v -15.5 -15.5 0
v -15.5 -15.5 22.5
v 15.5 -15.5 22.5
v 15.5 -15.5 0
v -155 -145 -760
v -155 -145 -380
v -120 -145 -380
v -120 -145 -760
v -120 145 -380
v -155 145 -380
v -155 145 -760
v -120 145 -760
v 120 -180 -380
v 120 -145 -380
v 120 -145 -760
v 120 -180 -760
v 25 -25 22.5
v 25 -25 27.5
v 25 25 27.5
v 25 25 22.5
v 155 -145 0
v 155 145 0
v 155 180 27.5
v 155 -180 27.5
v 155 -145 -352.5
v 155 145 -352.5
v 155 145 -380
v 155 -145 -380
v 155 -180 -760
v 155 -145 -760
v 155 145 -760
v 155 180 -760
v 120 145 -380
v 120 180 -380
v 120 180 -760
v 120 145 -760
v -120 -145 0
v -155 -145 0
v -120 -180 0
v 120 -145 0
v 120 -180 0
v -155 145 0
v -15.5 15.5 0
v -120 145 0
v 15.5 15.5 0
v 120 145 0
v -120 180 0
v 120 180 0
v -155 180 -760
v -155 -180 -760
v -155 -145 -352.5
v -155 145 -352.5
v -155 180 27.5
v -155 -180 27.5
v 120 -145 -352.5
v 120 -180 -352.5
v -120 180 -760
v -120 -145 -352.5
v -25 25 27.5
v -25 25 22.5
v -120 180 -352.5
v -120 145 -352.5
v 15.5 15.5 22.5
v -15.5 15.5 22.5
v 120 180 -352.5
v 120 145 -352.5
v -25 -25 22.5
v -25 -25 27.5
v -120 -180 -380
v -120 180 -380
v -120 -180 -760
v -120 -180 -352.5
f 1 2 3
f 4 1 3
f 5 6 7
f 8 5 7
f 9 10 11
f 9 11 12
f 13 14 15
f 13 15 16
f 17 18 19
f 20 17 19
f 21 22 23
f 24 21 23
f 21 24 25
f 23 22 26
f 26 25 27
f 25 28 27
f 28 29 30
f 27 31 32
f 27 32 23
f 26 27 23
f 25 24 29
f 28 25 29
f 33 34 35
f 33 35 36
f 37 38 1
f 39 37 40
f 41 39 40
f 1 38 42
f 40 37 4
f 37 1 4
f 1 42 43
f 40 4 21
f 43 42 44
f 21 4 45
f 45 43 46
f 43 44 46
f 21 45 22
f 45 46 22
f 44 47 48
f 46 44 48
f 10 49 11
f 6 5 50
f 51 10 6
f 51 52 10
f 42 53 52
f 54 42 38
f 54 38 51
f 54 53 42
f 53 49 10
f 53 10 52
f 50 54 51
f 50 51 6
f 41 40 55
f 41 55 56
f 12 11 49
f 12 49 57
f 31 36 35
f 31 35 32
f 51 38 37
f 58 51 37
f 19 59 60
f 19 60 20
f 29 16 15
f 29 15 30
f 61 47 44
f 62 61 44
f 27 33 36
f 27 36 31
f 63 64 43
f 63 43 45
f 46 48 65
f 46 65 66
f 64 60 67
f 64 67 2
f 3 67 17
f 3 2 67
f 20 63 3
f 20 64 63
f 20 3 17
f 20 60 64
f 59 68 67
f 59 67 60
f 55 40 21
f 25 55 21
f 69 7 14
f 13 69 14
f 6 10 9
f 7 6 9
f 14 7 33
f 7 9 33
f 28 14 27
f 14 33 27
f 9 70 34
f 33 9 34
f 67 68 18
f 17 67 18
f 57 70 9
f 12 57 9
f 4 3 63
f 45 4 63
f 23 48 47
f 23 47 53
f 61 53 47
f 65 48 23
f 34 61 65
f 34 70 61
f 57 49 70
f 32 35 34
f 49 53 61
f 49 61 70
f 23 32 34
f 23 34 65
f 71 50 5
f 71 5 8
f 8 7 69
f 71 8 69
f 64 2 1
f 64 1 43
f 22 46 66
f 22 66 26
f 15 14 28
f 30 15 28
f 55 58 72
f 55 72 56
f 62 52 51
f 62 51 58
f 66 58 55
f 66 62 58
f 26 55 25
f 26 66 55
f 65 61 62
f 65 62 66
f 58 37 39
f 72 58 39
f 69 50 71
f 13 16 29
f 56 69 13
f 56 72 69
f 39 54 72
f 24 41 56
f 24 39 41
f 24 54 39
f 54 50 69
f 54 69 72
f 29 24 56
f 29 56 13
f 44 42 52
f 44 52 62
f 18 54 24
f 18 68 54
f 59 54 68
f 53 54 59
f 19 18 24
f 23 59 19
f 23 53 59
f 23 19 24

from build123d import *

# Parameters (mm, degrees)
SKETCH_W            = 310
SKETCH_H            = 360
PAD_DEPTH           = 27.5
SKETCH001_W         = 35
SKETCH001_H         = 35
PAD001_DEPTH        = 760
LINEARPATTERN_COUNT = 2
LINEARPATTERN_PITCH = 380
SKETCH002_W         = 31
SKETCH002_H         = 31
POCKET_DEPTH        = 28
SKETCH003_W         = 50
SKETCH003_H         = 50
POCKET001_DEPTH     = 5


with BuildPart() as part:
    # Sketch → Pad (new body)
    with BuildSketch(Plane.XY):
        Rectangle(SKETCH_W, SKETCH_H)
    pad = extrude(amount=PAD_DEPTH)

    # Sketch001 (on Face5 of Pad) → Pad001 (join)
    with BuildSketch(Plane(origin=(0, 0, 0), x_dir=(1, 0, 0), z_dir=(0, 0, -1))):
        with Locations((-137.5, 162.5)):
            Rectangle(SKETCH001_W, SKETCH001_H)
        with Locations((-137.5, -162.5)):
            Rectangle(SKETCH001_W, SKETCH001_H)
        with Locations((137.5, 162.5)):
            Rectangle(SKETCH001_W, SKETCH001_H)
        with Locations((137.5, -162.5)):
            Rectangle(SKETCH001_W, SKETCH001_H)
    extrude(amount=PAD001_DEPTH)

    # LinearPattern: Pad ×2
    with Locations(*[(0, 0, -i * LINEARPATTERN_PITCH) for i in range(1, LINEARPATTERN_COUNT)]):
        add(pad)

    # Sketch002 (on Face15 of LinearPattern) → Pocket (cut)
    with BuildSketch(Plane.XY.offset(27.5)):
        Rectangle(SKETCH002_W, SKETCH002_H)
    extrude(amount=-POCKET_DEPTH, mode=Mode.SUBTRACT)

    # Sketch003 (on Face16 of Pocket) → Pocket001 (cut)
    with BuildSketch(Plane.XY.offset(27.5)):
        Rectangle(SKETCH003_W, SKETCH003_H)
    extrude(amount=-POCKET001_DEPTH, mode=Mode.SUBTRACT)


solid = part.part
